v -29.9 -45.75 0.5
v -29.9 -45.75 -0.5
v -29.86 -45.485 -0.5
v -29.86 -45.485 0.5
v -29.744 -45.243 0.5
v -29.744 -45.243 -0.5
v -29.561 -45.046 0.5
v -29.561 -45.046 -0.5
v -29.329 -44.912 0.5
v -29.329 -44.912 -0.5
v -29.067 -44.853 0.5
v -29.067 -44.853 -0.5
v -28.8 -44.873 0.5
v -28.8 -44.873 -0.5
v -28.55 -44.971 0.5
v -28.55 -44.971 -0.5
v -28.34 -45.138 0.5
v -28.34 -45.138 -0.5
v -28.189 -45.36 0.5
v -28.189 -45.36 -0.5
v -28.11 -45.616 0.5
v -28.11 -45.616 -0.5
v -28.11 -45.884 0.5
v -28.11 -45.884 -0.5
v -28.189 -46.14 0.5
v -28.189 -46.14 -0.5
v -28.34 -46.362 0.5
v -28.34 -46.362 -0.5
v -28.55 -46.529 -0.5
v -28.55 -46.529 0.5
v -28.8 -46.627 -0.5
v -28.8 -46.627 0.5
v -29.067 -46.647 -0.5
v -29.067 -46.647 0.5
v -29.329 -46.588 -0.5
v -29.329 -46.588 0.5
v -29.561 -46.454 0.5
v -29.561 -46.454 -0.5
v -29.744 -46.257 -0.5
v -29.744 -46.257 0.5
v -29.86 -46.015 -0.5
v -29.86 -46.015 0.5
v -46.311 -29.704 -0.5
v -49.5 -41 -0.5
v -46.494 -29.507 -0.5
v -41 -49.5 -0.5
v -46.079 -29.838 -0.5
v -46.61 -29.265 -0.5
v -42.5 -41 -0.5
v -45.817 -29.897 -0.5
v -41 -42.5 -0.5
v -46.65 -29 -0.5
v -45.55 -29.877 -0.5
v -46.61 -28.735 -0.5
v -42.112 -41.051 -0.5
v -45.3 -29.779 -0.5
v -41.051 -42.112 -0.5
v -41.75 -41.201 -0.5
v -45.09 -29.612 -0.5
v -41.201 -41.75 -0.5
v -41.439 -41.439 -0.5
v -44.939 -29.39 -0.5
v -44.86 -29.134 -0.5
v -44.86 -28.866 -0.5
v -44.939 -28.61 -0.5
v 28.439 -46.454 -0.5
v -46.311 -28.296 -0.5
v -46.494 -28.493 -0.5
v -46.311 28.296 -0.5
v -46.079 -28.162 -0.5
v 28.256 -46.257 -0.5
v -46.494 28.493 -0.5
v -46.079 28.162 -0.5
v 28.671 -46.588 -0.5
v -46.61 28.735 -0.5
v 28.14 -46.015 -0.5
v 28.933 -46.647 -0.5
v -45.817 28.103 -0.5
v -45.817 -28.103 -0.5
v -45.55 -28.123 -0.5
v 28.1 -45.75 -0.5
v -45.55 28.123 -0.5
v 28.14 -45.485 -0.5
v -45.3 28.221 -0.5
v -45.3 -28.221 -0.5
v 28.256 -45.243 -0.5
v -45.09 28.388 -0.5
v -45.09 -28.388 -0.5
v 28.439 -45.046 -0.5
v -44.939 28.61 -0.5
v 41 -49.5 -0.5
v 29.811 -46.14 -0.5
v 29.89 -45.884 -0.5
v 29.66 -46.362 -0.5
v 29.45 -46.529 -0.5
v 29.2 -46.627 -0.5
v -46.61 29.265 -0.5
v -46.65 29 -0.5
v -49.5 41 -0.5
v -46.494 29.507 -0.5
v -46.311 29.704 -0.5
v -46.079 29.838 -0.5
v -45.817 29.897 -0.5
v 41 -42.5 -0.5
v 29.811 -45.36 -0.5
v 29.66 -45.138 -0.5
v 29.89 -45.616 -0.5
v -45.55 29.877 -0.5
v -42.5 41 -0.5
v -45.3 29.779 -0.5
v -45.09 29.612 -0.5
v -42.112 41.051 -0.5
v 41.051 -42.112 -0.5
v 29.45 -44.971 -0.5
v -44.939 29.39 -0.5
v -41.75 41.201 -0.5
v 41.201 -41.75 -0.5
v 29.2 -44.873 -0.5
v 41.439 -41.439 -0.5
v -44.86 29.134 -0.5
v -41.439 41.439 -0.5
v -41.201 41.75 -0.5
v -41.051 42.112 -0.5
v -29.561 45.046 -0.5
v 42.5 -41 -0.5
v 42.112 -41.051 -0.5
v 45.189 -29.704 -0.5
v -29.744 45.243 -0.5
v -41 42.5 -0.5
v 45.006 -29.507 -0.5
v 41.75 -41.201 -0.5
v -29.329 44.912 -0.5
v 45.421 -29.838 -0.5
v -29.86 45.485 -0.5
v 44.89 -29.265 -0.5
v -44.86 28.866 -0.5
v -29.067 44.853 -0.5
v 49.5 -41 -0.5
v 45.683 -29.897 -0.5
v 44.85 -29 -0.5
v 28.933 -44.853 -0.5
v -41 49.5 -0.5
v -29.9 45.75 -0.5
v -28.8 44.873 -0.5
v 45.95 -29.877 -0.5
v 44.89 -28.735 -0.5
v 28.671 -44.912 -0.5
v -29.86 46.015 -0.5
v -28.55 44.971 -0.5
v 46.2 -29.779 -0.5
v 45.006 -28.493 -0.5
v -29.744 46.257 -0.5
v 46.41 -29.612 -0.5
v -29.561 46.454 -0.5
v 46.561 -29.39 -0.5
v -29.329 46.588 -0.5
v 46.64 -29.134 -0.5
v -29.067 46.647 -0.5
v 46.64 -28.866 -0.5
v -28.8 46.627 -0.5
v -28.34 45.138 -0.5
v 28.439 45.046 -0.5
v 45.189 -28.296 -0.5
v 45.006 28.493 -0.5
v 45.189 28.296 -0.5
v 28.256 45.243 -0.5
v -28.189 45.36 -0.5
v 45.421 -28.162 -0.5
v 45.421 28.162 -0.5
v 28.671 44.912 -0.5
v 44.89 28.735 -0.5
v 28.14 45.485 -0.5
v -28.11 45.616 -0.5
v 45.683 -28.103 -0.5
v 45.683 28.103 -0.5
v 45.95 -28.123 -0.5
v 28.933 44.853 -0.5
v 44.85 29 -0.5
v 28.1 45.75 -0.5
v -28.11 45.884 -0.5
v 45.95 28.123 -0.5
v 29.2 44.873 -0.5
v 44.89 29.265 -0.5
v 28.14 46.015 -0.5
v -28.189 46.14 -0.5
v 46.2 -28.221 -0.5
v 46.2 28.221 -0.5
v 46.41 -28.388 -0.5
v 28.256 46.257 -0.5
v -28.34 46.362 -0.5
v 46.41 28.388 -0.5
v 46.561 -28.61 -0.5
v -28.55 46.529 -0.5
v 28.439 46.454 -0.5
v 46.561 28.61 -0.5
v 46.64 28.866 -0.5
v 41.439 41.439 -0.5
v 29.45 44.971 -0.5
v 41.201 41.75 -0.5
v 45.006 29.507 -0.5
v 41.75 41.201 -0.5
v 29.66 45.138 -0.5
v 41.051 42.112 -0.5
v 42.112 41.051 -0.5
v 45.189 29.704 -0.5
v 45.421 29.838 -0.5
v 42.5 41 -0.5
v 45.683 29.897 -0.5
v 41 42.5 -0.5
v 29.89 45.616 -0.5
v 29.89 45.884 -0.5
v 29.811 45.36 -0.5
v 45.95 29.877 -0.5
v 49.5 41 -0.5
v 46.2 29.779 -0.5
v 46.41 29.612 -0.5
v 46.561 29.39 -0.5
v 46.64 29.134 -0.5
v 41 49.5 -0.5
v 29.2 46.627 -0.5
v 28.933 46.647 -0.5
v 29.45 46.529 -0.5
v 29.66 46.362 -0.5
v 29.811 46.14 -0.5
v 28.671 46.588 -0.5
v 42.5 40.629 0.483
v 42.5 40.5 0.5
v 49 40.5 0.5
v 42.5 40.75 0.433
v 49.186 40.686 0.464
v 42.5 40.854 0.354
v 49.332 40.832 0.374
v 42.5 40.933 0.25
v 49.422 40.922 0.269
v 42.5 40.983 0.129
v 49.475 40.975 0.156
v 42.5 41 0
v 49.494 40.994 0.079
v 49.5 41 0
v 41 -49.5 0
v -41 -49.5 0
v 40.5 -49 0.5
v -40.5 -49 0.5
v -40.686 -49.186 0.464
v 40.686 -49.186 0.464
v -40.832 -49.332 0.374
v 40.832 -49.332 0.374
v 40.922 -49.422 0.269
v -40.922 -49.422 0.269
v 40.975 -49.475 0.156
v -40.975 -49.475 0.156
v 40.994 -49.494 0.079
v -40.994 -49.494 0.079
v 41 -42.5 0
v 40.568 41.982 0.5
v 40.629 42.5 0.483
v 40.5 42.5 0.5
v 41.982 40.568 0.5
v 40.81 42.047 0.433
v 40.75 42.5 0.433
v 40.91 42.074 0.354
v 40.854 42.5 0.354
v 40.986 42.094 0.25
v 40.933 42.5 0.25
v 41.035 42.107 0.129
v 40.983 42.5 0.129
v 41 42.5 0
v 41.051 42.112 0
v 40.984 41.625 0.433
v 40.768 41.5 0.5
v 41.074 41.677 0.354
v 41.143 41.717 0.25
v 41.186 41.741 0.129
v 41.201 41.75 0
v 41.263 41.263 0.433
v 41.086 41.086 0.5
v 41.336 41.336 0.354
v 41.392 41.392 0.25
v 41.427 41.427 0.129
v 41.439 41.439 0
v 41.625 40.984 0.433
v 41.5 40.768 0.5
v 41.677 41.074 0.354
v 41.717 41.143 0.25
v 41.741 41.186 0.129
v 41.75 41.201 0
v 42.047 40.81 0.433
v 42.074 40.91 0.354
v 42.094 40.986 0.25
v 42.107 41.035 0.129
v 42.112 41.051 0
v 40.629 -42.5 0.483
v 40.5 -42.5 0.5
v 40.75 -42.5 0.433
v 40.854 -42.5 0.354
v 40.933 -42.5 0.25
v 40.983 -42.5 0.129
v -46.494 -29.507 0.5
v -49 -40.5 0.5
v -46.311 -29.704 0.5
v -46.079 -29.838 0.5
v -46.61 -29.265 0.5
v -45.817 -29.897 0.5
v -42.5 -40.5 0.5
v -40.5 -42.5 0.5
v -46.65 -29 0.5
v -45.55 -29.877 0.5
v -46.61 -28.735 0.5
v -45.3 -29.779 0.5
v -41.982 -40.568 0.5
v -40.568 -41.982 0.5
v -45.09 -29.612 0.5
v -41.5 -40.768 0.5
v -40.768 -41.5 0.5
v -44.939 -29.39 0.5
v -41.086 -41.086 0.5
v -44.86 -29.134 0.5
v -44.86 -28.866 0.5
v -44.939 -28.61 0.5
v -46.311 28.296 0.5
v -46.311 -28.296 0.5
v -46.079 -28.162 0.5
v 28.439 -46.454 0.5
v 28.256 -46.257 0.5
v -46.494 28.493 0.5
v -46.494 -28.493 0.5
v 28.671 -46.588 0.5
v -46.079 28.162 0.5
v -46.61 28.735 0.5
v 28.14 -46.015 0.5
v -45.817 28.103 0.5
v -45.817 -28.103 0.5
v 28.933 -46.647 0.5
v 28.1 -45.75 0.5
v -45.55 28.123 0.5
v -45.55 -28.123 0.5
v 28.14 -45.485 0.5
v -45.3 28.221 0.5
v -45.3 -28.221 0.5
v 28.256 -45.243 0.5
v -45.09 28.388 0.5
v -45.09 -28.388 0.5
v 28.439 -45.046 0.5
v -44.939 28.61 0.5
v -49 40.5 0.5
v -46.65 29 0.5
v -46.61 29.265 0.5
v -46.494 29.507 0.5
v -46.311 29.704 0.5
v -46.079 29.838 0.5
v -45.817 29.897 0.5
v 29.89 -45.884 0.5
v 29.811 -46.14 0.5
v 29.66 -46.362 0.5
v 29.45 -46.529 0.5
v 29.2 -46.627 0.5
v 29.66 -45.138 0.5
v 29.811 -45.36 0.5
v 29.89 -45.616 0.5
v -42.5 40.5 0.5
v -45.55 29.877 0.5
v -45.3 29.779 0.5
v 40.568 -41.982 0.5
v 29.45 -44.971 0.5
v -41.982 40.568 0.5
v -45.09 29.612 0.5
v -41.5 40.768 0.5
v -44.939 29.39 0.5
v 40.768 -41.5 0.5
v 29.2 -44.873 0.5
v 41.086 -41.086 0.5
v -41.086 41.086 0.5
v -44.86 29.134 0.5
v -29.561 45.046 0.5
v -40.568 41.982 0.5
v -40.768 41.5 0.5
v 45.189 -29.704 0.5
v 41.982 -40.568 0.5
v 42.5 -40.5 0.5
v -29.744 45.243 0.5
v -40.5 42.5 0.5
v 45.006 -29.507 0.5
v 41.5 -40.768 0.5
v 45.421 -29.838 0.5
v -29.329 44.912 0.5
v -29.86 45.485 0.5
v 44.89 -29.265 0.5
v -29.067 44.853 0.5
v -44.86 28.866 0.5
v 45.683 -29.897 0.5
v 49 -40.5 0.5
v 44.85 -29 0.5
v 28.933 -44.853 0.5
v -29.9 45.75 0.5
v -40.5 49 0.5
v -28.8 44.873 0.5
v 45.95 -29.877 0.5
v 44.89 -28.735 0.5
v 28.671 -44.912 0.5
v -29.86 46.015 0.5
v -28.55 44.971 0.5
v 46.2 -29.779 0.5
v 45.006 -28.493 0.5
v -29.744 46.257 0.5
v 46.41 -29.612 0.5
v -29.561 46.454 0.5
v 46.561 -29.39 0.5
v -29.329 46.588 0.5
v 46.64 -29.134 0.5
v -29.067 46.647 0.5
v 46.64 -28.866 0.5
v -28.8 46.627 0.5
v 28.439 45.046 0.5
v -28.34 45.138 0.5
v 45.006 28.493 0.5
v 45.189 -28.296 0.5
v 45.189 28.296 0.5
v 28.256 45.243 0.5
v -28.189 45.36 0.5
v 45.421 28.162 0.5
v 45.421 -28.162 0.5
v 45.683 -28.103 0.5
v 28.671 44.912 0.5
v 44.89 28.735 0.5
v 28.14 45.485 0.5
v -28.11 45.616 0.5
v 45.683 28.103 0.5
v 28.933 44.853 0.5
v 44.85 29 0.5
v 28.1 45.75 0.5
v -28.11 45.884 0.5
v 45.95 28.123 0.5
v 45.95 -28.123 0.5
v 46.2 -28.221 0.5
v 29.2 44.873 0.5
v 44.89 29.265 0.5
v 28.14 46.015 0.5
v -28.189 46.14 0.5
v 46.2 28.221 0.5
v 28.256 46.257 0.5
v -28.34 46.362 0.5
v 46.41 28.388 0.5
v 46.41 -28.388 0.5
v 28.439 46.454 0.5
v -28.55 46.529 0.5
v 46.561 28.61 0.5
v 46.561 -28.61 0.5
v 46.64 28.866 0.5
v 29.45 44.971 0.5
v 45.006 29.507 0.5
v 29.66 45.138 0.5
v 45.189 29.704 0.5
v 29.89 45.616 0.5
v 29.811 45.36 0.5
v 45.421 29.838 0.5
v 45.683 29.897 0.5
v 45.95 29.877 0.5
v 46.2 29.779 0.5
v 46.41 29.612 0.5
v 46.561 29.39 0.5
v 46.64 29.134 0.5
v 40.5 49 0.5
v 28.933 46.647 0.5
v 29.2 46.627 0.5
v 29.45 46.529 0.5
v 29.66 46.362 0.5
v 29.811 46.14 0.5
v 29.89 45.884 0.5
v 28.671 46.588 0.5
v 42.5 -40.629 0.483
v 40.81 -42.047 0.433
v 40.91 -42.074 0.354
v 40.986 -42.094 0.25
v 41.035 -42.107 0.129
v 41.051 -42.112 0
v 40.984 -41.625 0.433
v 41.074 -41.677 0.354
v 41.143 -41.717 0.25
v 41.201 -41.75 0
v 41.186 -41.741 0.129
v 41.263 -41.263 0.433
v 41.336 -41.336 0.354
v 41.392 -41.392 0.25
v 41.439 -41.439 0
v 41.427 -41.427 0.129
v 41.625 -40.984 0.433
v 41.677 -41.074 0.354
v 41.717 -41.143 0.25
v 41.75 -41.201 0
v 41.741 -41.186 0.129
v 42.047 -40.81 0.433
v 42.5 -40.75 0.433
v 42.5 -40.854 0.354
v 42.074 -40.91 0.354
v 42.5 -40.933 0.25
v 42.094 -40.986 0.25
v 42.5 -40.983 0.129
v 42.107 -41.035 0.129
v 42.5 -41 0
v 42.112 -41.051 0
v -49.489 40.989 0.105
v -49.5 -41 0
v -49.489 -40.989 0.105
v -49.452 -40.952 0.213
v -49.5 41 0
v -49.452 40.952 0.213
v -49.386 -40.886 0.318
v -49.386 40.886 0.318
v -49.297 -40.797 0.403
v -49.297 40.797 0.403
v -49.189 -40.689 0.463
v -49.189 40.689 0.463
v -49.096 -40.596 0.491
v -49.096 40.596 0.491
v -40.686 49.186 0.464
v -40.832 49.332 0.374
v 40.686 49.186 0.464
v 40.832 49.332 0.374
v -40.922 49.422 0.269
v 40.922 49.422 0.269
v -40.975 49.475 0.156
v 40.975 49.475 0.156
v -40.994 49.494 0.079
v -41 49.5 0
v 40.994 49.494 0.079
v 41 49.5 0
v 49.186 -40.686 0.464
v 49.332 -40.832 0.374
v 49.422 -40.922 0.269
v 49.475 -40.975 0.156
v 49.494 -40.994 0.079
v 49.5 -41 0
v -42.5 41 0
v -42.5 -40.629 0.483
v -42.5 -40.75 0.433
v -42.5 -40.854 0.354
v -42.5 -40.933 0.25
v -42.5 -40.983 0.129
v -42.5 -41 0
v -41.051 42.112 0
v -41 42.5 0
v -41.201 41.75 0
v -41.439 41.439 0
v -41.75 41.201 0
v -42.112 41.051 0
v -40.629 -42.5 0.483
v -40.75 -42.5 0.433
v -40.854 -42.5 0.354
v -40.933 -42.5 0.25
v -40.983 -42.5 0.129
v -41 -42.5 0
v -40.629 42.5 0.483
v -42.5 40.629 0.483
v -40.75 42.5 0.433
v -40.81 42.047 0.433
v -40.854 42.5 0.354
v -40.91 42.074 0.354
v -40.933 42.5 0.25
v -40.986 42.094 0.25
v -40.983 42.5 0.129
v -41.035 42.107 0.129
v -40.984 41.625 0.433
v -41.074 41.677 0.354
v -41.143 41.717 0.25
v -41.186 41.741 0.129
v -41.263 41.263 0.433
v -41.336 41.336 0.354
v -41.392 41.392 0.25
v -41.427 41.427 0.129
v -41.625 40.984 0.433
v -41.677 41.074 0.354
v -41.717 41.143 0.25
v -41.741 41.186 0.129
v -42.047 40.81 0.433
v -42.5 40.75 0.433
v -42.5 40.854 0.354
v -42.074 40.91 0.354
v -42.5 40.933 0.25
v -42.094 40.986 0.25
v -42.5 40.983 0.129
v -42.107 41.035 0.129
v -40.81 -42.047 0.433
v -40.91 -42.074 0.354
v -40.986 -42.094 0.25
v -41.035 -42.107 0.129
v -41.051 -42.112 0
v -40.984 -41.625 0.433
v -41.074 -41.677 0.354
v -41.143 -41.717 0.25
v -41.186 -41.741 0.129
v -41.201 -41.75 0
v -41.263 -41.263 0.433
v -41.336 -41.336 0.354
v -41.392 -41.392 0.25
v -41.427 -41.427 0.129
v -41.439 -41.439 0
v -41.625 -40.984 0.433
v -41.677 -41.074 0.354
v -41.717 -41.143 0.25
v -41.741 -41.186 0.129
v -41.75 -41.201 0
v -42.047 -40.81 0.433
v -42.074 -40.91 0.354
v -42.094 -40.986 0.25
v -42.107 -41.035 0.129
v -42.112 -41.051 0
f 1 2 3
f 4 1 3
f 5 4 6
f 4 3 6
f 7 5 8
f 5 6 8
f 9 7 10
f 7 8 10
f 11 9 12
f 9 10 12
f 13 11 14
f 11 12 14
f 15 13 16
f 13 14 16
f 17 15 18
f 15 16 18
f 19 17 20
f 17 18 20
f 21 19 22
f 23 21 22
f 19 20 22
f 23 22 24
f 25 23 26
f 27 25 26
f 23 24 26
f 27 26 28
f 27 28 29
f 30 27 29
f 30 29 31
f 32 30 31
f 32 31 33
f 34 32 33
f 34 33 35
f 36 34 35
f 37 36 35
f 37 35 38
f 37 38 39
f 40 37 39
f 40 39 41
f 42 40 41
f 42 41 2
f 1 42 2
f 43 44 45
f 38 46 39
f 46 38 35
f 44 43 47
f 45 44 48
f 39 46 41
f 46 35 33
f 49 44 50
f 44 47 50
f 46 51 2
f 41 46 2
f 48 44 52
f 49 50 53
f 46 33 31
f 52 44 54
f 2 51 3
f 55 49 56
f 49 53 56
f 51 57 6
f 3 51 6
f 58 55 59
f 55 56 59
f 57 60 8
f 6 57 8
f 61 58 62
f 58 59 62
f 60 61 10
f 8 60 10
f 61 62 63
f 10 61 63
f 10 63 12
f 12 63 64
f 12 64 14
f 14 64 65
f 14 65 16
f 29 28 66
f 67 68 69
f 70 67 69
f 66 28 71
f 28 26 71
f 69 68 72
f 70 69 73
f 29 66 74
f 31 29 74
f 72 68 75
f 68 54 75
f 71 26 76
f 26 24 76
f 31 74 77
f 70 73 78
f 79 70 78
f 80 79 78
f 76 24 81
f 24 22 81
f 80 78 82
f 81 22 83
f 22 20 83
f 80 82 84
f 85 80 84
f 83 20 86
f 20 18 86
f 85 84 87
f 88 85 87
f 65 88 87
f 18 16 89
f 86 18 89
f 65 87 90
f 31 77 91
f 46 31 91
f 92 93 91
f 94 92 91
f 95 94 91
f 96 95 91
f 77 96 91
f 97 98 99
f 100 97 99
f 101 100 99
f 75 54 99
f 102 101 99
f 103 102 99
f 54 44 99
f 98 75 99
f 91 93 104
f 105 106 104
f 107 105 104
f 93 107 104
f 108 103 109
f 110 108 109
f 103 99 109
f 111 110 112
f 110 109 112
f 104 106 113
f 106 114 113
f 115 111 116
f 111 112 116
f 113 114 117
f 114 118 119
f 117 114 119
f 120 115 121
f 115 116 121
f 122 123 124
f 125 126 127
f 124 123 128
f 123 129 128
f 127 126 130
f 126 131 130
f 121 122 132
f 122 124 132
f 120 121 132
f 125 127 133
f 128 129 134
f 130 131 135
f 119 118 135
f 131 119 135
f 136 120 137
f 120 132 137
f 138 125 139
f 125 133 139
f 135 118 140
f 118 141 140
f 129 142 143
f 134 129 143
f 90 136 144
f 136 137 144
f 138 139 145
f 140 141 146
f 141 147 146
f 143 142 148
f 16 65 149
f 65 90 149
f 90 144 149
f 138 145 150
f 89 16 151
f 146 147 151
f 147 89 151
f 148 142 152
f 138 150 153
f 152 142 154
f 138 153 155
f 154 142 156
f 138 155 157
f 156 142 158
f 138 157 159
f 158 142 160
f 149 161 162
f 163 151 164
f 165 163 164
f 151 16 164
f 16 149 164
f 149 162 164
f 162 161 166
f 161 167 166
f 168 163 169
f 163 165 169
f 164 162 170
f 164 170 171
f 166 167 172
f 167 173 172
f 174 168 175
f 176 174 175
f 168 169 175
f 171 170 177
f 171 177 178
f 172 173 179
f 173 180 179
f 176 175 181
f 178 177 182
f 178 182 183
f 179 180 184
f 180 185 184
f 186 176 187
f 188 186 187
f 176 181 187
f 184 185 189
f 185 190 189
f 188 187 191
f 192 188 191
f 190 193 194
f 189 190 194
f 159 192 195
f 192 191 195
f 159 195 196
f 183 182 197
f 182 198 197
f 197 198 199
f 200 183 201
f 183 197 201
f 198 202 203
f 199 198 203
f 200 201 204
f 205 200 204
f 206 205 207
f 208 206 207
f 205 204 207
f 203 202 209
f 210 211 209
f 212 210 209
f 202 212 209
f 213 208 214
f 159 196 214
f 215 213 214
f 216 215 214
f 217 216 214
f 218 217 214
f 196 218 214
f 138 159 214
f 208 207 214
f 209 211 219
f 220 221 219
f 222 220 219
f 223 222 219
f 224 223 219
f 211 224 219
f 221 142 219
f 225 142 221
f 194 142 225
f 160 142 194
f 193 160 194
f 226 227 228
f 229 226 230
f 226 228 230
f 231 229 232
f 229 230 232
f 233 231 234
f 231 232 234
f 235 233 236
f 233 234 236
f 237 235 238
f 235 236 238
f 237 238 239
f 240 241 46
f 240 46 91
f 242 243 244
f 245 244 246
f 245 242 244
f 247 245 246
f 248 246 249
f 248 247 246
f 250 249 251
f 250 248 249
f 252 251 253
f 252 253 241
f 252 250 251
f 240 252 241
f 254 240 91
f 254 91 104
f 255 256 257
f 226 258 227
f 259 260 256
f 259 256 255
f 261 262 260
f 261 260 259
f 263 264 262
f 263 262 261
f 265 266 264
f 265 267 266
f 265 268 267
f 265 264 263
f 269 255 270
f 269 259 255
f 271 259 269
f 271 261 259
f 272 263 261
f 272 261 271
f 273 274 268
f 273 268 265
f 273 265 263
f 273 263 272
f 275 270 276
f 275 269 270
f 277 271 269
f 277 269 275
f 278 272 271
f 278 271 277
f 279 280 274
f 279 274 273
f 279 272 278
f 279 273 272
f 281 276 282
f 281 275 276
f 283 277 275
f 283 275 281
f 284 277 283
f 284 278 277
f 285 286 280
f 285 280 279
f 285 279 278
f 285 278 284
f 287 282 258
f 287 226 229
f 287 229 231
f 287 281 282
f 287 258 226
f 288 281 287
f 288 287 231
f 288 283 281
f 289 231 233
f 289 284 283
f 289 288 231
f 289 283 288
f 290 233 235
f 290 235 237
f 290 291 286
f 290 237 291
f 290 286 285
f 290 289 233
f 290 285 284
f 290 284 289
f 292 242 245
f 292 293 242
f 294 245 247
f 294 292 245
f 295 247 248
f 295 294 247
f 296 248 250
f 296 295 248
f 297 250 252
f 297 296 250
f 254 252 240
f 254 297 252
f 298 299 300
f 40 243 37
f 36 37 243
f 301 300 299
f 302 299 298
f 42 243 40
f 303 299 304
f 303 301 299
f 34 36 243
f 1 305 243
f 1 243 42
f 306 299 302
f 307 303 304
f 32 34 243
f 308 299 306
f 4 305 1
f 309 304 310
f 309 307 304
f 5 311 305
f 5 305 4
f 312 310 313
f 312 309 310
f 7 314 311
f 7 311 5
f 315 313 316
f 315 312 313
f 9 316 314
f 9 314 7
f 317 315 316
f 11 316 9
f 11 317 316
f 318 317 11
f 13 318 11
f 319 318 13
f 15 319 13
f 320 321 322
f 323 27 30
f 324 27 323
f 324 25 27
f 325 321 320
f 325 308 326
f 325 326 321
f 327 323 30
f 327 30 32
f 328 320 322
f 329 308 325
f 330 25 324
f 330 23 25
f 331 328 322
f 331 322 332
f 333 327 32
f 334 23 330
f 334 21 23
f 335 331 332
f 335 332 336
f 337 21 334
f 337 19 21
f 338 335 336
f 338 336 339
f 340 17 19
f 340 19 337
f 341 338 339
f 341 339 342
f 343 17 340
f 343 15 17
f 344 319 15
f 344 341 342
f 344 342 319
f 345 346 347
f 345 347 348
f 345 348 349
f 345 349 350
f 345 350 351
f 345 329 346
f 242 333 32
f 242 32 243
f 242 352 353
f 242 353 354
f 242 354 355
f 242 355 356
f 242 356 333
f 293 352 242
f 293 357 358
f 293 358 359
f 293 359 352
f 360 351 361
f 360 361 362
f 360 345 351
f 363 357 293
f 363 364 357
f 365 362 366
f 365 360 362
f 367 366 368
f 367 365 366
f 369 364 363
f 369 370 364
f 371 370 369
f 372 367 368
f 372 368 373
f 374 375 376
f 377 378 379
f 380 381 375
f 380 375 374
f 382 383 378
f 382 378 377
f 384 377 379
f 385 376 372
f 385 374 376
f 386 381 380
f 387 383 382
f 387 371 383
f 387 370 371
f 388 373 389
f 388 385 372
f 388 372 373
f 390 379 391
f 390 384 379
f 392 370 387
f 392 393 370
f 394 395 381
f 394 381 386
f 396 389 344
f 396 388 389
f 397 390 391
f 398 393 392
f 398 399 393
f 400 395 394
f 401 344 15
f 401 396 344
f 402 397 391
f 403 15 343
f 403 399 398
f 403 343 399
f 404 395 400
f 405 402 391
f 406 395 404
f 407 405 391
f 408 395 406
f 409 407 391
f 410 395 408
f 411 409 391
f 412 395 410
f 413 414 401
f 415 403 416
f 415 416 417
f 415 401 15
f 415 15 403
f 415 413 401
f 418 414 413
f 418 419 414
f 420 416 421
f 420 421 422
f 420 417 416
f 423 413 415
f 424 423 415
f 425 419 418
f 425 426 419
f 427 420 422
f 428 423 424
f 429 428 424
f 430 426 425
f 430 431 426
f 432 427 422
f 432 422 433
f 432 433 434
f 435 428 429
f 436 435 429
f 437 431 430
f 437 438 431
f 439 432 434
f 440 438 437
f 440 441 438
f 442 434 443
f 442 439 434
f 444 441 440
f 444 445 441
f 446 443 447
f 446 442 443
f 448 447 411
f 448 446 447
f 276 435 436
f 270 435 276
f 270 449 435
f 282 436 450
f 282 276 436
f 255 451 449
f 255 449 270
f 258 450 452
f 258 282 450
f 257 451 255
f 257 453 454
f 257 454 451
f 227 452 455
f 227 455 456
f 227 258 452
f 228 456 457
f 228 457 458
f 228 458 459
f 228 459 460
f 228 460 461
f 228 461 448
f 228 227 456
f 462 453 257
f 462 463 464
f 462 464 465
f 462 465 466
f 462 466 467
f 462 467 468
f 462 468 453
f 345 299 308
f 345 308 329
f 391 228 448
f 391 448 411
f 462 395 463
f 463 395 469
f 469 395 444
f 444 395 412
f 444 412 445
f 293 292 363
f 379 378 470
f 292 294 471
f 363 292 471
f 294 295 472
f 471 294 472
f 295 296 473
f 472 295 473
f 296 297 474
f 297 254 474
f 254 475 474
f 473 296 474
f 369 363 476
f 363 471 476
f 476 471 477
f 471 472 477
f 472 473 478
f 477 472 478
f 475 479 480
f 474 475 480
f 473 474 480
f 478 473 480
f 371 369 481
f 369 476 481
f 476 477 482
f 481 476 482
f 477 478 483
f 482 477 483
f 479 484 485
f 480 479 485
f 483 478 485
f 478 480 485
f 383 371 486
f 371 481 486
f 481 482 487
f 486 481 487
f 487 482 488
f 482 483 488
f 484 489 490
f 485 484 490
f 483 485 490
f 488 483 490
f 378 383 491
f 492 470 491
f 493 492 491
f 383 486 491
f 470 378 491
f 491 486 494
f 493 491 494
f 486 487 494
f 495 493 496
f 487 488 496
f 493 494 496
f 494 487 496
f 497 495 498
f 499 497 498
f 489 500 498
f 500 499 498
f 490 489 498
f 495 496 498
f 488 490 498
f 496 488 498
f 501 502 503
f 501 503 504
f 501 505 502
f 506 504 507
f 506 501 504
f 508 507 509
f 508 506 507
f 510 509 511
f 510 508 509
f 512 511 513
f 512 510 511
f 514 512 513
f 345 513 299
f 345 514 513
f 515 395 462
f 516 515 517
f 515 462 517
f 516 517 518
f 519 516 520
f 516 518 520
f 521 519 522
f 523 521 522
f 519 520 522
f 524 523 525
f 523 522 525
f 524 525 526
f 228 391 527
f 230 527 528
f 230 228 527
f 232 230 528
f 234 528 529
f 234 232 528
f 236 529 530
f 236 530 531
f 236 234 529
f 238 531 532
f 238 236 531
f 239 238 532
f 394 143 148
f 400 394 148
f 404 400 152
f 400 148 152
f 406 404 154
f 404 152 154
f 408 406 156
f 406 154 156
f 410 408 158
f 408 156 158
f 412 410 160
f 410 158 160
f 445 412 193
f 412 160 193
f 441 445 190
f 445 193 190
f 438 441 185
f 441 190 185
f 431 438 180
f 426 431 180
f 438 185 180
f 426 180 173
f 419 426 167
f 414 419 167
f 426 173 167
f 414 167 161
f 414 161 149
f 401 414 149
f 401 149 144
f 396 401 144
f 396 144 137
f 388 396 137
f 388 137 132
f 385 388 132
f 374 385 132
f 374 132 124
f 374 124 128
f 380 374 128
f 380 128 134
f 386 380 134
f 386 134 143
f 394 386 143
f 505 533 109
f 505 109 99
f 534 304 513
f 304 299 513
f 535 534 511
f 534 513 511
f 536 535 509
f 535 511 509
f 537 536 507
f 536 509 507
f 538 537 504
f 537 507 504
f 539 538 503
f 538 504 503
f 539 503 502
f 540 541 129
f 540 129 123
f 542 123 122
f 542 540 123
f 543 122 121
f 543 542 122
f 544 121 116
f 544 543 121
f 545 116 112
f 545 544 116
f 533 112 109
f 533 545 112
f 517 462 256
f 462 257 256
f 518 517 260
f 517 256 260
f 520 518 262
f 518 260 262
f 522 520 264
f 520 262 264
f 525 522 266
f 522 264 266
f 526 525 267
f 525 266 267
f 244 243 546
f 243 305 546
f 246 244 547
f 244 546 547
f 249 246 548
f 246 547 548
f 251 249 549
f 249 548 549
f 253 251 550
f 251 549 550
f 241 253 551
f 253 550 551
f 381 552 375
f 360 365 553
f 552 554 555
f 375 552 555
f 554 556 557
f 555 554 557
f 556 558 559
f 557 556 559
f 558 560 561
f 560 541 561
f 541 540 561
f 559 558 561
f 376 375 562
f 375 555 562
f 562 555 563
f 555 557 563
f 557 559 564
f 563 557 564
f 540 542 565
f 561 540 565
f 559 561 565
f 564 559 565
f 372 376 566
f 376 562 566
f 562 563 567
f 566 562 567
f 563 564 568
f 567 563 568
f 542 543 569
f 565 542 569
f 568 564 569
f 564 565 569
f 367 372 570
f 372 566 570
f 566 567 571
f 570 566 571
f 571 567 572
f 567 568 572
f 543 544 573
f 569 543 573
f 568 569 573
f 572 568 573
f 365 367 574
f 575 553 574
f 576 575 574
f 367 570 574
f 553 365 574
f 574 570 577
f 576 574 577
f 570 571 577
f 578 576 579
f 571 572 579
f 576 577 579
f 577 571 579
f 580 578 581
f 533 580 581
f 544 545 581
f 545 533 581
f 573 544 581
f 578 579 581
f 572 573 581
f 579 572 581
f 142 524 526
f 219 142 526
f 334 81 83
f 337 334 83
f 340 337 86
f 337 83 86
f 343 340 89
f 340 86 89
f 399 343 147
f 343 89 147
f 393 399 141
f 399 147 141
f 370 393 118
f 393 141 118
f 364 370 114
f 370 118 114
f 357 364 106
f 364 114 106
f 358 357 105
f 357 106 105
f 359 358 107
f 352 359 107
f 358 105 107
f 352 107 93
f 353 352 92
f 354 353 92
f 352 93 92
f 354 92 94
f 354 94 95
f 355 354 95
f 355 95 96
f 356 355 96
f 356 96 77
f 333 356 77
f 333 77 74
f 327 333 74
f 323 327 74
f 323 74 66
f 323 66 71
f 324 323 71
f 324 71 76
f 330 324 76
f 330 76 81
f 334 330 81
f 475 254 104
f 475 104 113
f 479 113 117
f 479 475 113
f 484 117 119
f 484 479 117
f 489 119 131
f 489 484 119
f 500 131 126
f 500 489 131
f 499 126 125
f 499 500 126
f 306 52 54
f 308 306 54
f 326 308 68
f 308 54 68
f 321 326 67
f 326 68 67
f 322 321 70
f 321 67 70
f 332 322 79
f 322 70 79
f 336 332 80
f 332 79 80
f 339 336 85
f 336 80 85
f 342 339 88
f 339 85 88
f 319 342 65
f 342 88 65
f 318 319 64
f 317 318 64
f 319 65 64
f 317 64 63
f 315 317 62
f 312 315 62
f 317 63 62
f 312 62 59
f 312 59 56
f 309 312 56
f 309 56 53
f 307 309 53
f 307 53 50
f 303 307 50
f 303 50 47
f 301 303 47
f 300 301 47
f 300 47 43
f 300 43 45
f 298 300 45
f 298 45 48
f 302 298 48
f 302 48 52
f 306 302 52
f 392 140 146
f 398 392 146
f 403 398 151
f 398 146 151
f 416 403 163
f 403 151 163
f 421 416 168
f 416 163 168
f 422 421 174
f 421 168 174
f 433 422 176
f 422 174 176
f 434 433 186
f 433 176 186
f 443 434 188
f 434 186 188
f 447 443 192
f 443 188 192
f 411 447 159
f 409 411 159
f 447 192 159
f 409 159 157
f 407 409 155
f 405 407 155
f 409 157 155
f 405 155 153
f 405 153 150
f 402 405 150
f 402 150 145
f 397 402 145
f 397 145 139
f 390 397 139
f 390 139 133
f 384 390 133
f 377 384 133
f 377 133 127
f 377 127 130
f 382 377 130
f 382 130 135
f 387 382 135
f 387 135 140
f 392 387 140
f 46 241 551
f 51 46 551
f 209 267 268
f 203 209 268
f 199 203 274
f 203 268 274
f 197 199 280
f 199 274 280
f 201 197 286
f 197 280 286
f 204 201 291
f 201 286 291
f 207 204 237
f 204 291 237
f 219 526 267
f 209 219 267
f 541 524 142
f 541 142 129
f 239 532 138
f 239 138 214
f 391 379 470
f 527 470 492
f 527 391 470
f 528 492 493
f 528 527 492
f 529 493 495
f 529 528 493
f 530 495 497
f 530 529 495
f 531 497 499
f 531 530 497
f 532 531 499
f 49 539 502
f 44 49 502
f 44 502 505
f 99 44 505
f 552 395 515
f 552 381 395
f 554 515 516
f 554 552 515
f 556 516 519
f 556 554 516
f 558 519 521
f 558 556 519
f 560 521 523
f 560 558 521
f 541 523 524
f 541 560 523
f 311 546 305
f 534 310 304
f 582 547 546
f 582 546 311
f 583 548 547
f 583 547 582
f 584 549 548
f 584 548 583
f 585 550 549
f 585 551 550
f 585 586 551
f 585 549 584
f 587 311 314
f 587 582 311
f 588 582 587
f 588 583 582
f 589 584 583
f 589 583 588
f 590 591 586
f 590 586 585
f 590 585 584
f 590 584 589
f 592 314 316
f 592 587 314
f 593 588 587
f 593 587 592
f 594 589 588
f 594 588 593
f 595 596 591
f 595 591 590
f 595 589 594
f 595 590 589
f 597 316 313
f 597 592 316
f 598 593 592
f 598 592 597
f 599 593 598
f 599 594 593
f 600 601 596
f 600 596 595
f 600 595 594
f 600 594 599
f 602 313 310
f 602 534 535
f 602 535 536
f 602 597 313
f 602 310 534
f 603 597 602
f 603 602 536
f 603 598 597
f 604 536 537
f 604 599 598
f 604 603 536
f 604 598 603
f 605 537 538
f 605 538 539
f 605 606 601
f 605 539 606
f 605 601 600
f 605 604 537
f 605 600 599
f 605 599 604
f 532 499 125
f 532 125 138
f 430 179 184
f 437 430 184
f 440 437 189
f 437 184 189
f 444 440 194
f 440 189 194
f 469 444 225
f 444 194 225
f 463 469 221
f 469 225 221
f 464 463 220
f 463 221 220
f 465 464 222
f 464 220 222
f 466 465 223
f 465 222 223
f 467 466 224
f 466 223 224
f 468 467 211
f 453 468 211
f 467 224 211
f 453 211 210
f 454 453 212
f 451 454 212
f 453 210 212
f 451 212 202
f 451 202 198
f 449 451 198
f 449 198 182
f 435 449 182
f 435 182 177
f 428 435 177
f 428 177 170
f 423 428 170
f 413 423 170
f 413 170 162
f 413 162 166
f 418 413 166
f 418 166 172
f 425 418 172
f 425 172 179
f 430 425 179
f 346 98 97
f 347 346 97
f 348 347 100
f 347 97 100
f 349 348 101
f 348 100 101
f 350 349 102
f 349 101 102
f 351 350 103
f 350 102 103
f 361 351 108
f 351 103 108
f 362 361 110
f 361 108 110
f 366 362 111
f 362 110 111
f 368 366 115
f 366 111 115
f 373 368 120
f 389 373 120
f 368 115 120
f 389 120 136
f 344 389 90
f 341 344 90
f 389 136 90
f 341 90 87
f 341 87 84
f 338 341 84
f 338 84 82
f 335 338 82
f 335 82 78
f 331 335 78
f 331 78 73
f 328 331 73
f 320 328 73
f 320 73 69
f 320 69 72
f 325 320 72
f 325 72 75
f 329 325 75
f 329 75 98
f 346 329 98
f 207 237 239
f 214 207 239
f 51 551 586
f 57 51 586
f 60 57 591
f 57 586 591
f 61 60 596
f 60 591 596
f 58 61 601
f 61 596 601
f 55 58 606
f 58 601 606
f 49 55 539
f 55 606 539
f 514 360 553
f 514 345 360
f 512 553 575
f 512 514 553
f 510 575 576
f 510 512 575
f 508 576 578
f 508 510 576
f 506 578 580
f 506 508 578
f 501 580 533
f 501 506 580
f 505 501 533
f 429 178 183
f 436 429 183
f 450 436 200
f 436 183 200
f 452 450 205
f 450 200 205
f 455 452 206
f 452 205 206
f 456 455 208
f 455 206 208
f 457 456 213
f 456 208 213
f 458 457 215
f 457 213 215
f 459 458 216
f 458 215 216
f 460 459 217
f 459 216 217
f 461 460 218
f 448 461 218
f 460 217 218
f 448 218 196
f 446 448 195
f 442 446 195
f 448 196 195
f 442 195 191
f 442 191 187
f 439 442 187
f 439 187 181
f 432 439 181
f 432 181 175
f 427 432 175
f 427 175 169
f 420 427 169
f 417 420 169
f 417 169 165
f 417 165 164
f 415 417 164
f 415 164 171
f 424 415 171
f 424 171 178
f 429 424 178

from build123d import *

# Parameters (mm, degrees)
SKETCH1_W                  = 99
SKETCH1_H                  = 99
BOSS_EXTRUDE1_DEPTH        = 0.5
CUT_EXTRUDE1_DEPTH         = 71.010713466
M1_6_CLEARANCE_HOLE1_D     = 1.8
M1_6_CLEARANCE_HOLE1_DEPTH = 3
M1_6_CLEARANCE_HOLE1_TIP   = 0.540774557
FILLET1_R                  = 0.5


with BuildPart() as part:
    # Sketch1 → Boss-Extrude1 (new, symmetric)
    with BuildSketch(Plane.XY):
        Rectangle(SKETCH1_W, SKETCH1_H)
    extrude(amount=BOSS_EXTRUDE1_DEPTH, both=True)

    # Sketch2 → Cut-Extrude1 (cut, through all)
    with BuildSketch(Plane.XY.offset(0.5)):
        with BuildLine():
            Line((-49.5, 49.5), (-41, 49.5))
            Line((-41, 49.5), (-41, 42.5))
            ThreePointArc((-41, 42.5), (-41.439339828, 41.439339828), (-42.5, 41))
            Line((-42.5, 41), (-49.5, 41))
            Line((-49.5, 41), (-49.5, 49.5))
        make_face()
        with BuildLine():
            Line((49.5, 49.5), (41, 49.5))
            Line((41, 49.5), (41, 42.5))
            ThreePointArc((41, 42.5), (41.439339828, 41.439339828), (42.5, 41))
            Line((42.5, 41), (49.5, 41))
            Line((49.5, 41), (49.5, 49.5))
        make_face()
        with BuildLine():
            Line((-49.5, -49.5), (-41, -49.5))
            Line((-41, -49.5), (-41, -42.5))
            ThreePointArc((-41, -42.5), (-41.439339828, -41.439339828), (-42.5, -41))
            Line((-42.5, -41), (-49.5, -41))
            Line((-49.5, -41), (-49.5, -49.5))
        make_face()
        with BuildLine():
            Line((49.5, -49.5), (41, -49.5))
            Line((41, -49.5), (41, -42.5))
            ThreePointArc((41, -42.5), (41.439339828, -41.439339828), (42.5, -41))
            Line((42.5, -41), (49.5, -41))
            Line((49.5, -41), (49.5, -49.5))
        make_face()
    extrude(amount=-CUT_EXTRUDE1_DEPTH, mode=Mode.SUBTRACT)

    # M1.6 Clearance Hole1
    with Locations(Plane.XY.offset(0.5)):
        with Locations((-45.75, 29), (-29, 45.75), (29, 45.75), (45.75, 29), (45.75, -29), (29, -45.75), (-29, -45.75), (-45.75, -29)):
            Hole(M1_6_CLEARANCE_HOLE1_D / 2, depth=M1_6_CLEARANCE_HOLE1_DEPTH)
            with Locations((0, 0, -(M1_6_CLEARANCE_HOLE1_DEPTH + M1_6_CLEARANCE_HOLE1_TIP / 2))):  # 118° drill point
                Cone(0, M1_6_CLEARANCE_HOLE1_D / 2, M1_6_CLEARANCE_HOLE1_TIP, mode=Mode.SUBTRACT)

    # Fillet1
    fillet1_edges = [part.edges().sort_by_distance(p)[0] for p in [
        (-49.5, 0, 0.5),
        (-46, 41, 0.5),
        (-41.439339828, 41.439339828, 0.5),
        (-41, 46, 0.5),
        (0, 49.5, 0.5),
        (41.439339828, 41.439339828, 0.5),
        (46, 41, 0.5),
        (41, 46, 0.5),
        (49.5, 0, 0.5),
        (41.439339828, -41.439339828, 0.5),
        (41, -46, 0.5),
        (46, -41, 0.5),
        (0, -49.5, 0.5),
        (-41, -46, 0.5),
        (-41.439339828, -41.439339828, 0.5),
        (-46, -41, 0.5),
    ]]
    fillet(fillet1_edges, radius=FILLET1_R)


solid = part.part
